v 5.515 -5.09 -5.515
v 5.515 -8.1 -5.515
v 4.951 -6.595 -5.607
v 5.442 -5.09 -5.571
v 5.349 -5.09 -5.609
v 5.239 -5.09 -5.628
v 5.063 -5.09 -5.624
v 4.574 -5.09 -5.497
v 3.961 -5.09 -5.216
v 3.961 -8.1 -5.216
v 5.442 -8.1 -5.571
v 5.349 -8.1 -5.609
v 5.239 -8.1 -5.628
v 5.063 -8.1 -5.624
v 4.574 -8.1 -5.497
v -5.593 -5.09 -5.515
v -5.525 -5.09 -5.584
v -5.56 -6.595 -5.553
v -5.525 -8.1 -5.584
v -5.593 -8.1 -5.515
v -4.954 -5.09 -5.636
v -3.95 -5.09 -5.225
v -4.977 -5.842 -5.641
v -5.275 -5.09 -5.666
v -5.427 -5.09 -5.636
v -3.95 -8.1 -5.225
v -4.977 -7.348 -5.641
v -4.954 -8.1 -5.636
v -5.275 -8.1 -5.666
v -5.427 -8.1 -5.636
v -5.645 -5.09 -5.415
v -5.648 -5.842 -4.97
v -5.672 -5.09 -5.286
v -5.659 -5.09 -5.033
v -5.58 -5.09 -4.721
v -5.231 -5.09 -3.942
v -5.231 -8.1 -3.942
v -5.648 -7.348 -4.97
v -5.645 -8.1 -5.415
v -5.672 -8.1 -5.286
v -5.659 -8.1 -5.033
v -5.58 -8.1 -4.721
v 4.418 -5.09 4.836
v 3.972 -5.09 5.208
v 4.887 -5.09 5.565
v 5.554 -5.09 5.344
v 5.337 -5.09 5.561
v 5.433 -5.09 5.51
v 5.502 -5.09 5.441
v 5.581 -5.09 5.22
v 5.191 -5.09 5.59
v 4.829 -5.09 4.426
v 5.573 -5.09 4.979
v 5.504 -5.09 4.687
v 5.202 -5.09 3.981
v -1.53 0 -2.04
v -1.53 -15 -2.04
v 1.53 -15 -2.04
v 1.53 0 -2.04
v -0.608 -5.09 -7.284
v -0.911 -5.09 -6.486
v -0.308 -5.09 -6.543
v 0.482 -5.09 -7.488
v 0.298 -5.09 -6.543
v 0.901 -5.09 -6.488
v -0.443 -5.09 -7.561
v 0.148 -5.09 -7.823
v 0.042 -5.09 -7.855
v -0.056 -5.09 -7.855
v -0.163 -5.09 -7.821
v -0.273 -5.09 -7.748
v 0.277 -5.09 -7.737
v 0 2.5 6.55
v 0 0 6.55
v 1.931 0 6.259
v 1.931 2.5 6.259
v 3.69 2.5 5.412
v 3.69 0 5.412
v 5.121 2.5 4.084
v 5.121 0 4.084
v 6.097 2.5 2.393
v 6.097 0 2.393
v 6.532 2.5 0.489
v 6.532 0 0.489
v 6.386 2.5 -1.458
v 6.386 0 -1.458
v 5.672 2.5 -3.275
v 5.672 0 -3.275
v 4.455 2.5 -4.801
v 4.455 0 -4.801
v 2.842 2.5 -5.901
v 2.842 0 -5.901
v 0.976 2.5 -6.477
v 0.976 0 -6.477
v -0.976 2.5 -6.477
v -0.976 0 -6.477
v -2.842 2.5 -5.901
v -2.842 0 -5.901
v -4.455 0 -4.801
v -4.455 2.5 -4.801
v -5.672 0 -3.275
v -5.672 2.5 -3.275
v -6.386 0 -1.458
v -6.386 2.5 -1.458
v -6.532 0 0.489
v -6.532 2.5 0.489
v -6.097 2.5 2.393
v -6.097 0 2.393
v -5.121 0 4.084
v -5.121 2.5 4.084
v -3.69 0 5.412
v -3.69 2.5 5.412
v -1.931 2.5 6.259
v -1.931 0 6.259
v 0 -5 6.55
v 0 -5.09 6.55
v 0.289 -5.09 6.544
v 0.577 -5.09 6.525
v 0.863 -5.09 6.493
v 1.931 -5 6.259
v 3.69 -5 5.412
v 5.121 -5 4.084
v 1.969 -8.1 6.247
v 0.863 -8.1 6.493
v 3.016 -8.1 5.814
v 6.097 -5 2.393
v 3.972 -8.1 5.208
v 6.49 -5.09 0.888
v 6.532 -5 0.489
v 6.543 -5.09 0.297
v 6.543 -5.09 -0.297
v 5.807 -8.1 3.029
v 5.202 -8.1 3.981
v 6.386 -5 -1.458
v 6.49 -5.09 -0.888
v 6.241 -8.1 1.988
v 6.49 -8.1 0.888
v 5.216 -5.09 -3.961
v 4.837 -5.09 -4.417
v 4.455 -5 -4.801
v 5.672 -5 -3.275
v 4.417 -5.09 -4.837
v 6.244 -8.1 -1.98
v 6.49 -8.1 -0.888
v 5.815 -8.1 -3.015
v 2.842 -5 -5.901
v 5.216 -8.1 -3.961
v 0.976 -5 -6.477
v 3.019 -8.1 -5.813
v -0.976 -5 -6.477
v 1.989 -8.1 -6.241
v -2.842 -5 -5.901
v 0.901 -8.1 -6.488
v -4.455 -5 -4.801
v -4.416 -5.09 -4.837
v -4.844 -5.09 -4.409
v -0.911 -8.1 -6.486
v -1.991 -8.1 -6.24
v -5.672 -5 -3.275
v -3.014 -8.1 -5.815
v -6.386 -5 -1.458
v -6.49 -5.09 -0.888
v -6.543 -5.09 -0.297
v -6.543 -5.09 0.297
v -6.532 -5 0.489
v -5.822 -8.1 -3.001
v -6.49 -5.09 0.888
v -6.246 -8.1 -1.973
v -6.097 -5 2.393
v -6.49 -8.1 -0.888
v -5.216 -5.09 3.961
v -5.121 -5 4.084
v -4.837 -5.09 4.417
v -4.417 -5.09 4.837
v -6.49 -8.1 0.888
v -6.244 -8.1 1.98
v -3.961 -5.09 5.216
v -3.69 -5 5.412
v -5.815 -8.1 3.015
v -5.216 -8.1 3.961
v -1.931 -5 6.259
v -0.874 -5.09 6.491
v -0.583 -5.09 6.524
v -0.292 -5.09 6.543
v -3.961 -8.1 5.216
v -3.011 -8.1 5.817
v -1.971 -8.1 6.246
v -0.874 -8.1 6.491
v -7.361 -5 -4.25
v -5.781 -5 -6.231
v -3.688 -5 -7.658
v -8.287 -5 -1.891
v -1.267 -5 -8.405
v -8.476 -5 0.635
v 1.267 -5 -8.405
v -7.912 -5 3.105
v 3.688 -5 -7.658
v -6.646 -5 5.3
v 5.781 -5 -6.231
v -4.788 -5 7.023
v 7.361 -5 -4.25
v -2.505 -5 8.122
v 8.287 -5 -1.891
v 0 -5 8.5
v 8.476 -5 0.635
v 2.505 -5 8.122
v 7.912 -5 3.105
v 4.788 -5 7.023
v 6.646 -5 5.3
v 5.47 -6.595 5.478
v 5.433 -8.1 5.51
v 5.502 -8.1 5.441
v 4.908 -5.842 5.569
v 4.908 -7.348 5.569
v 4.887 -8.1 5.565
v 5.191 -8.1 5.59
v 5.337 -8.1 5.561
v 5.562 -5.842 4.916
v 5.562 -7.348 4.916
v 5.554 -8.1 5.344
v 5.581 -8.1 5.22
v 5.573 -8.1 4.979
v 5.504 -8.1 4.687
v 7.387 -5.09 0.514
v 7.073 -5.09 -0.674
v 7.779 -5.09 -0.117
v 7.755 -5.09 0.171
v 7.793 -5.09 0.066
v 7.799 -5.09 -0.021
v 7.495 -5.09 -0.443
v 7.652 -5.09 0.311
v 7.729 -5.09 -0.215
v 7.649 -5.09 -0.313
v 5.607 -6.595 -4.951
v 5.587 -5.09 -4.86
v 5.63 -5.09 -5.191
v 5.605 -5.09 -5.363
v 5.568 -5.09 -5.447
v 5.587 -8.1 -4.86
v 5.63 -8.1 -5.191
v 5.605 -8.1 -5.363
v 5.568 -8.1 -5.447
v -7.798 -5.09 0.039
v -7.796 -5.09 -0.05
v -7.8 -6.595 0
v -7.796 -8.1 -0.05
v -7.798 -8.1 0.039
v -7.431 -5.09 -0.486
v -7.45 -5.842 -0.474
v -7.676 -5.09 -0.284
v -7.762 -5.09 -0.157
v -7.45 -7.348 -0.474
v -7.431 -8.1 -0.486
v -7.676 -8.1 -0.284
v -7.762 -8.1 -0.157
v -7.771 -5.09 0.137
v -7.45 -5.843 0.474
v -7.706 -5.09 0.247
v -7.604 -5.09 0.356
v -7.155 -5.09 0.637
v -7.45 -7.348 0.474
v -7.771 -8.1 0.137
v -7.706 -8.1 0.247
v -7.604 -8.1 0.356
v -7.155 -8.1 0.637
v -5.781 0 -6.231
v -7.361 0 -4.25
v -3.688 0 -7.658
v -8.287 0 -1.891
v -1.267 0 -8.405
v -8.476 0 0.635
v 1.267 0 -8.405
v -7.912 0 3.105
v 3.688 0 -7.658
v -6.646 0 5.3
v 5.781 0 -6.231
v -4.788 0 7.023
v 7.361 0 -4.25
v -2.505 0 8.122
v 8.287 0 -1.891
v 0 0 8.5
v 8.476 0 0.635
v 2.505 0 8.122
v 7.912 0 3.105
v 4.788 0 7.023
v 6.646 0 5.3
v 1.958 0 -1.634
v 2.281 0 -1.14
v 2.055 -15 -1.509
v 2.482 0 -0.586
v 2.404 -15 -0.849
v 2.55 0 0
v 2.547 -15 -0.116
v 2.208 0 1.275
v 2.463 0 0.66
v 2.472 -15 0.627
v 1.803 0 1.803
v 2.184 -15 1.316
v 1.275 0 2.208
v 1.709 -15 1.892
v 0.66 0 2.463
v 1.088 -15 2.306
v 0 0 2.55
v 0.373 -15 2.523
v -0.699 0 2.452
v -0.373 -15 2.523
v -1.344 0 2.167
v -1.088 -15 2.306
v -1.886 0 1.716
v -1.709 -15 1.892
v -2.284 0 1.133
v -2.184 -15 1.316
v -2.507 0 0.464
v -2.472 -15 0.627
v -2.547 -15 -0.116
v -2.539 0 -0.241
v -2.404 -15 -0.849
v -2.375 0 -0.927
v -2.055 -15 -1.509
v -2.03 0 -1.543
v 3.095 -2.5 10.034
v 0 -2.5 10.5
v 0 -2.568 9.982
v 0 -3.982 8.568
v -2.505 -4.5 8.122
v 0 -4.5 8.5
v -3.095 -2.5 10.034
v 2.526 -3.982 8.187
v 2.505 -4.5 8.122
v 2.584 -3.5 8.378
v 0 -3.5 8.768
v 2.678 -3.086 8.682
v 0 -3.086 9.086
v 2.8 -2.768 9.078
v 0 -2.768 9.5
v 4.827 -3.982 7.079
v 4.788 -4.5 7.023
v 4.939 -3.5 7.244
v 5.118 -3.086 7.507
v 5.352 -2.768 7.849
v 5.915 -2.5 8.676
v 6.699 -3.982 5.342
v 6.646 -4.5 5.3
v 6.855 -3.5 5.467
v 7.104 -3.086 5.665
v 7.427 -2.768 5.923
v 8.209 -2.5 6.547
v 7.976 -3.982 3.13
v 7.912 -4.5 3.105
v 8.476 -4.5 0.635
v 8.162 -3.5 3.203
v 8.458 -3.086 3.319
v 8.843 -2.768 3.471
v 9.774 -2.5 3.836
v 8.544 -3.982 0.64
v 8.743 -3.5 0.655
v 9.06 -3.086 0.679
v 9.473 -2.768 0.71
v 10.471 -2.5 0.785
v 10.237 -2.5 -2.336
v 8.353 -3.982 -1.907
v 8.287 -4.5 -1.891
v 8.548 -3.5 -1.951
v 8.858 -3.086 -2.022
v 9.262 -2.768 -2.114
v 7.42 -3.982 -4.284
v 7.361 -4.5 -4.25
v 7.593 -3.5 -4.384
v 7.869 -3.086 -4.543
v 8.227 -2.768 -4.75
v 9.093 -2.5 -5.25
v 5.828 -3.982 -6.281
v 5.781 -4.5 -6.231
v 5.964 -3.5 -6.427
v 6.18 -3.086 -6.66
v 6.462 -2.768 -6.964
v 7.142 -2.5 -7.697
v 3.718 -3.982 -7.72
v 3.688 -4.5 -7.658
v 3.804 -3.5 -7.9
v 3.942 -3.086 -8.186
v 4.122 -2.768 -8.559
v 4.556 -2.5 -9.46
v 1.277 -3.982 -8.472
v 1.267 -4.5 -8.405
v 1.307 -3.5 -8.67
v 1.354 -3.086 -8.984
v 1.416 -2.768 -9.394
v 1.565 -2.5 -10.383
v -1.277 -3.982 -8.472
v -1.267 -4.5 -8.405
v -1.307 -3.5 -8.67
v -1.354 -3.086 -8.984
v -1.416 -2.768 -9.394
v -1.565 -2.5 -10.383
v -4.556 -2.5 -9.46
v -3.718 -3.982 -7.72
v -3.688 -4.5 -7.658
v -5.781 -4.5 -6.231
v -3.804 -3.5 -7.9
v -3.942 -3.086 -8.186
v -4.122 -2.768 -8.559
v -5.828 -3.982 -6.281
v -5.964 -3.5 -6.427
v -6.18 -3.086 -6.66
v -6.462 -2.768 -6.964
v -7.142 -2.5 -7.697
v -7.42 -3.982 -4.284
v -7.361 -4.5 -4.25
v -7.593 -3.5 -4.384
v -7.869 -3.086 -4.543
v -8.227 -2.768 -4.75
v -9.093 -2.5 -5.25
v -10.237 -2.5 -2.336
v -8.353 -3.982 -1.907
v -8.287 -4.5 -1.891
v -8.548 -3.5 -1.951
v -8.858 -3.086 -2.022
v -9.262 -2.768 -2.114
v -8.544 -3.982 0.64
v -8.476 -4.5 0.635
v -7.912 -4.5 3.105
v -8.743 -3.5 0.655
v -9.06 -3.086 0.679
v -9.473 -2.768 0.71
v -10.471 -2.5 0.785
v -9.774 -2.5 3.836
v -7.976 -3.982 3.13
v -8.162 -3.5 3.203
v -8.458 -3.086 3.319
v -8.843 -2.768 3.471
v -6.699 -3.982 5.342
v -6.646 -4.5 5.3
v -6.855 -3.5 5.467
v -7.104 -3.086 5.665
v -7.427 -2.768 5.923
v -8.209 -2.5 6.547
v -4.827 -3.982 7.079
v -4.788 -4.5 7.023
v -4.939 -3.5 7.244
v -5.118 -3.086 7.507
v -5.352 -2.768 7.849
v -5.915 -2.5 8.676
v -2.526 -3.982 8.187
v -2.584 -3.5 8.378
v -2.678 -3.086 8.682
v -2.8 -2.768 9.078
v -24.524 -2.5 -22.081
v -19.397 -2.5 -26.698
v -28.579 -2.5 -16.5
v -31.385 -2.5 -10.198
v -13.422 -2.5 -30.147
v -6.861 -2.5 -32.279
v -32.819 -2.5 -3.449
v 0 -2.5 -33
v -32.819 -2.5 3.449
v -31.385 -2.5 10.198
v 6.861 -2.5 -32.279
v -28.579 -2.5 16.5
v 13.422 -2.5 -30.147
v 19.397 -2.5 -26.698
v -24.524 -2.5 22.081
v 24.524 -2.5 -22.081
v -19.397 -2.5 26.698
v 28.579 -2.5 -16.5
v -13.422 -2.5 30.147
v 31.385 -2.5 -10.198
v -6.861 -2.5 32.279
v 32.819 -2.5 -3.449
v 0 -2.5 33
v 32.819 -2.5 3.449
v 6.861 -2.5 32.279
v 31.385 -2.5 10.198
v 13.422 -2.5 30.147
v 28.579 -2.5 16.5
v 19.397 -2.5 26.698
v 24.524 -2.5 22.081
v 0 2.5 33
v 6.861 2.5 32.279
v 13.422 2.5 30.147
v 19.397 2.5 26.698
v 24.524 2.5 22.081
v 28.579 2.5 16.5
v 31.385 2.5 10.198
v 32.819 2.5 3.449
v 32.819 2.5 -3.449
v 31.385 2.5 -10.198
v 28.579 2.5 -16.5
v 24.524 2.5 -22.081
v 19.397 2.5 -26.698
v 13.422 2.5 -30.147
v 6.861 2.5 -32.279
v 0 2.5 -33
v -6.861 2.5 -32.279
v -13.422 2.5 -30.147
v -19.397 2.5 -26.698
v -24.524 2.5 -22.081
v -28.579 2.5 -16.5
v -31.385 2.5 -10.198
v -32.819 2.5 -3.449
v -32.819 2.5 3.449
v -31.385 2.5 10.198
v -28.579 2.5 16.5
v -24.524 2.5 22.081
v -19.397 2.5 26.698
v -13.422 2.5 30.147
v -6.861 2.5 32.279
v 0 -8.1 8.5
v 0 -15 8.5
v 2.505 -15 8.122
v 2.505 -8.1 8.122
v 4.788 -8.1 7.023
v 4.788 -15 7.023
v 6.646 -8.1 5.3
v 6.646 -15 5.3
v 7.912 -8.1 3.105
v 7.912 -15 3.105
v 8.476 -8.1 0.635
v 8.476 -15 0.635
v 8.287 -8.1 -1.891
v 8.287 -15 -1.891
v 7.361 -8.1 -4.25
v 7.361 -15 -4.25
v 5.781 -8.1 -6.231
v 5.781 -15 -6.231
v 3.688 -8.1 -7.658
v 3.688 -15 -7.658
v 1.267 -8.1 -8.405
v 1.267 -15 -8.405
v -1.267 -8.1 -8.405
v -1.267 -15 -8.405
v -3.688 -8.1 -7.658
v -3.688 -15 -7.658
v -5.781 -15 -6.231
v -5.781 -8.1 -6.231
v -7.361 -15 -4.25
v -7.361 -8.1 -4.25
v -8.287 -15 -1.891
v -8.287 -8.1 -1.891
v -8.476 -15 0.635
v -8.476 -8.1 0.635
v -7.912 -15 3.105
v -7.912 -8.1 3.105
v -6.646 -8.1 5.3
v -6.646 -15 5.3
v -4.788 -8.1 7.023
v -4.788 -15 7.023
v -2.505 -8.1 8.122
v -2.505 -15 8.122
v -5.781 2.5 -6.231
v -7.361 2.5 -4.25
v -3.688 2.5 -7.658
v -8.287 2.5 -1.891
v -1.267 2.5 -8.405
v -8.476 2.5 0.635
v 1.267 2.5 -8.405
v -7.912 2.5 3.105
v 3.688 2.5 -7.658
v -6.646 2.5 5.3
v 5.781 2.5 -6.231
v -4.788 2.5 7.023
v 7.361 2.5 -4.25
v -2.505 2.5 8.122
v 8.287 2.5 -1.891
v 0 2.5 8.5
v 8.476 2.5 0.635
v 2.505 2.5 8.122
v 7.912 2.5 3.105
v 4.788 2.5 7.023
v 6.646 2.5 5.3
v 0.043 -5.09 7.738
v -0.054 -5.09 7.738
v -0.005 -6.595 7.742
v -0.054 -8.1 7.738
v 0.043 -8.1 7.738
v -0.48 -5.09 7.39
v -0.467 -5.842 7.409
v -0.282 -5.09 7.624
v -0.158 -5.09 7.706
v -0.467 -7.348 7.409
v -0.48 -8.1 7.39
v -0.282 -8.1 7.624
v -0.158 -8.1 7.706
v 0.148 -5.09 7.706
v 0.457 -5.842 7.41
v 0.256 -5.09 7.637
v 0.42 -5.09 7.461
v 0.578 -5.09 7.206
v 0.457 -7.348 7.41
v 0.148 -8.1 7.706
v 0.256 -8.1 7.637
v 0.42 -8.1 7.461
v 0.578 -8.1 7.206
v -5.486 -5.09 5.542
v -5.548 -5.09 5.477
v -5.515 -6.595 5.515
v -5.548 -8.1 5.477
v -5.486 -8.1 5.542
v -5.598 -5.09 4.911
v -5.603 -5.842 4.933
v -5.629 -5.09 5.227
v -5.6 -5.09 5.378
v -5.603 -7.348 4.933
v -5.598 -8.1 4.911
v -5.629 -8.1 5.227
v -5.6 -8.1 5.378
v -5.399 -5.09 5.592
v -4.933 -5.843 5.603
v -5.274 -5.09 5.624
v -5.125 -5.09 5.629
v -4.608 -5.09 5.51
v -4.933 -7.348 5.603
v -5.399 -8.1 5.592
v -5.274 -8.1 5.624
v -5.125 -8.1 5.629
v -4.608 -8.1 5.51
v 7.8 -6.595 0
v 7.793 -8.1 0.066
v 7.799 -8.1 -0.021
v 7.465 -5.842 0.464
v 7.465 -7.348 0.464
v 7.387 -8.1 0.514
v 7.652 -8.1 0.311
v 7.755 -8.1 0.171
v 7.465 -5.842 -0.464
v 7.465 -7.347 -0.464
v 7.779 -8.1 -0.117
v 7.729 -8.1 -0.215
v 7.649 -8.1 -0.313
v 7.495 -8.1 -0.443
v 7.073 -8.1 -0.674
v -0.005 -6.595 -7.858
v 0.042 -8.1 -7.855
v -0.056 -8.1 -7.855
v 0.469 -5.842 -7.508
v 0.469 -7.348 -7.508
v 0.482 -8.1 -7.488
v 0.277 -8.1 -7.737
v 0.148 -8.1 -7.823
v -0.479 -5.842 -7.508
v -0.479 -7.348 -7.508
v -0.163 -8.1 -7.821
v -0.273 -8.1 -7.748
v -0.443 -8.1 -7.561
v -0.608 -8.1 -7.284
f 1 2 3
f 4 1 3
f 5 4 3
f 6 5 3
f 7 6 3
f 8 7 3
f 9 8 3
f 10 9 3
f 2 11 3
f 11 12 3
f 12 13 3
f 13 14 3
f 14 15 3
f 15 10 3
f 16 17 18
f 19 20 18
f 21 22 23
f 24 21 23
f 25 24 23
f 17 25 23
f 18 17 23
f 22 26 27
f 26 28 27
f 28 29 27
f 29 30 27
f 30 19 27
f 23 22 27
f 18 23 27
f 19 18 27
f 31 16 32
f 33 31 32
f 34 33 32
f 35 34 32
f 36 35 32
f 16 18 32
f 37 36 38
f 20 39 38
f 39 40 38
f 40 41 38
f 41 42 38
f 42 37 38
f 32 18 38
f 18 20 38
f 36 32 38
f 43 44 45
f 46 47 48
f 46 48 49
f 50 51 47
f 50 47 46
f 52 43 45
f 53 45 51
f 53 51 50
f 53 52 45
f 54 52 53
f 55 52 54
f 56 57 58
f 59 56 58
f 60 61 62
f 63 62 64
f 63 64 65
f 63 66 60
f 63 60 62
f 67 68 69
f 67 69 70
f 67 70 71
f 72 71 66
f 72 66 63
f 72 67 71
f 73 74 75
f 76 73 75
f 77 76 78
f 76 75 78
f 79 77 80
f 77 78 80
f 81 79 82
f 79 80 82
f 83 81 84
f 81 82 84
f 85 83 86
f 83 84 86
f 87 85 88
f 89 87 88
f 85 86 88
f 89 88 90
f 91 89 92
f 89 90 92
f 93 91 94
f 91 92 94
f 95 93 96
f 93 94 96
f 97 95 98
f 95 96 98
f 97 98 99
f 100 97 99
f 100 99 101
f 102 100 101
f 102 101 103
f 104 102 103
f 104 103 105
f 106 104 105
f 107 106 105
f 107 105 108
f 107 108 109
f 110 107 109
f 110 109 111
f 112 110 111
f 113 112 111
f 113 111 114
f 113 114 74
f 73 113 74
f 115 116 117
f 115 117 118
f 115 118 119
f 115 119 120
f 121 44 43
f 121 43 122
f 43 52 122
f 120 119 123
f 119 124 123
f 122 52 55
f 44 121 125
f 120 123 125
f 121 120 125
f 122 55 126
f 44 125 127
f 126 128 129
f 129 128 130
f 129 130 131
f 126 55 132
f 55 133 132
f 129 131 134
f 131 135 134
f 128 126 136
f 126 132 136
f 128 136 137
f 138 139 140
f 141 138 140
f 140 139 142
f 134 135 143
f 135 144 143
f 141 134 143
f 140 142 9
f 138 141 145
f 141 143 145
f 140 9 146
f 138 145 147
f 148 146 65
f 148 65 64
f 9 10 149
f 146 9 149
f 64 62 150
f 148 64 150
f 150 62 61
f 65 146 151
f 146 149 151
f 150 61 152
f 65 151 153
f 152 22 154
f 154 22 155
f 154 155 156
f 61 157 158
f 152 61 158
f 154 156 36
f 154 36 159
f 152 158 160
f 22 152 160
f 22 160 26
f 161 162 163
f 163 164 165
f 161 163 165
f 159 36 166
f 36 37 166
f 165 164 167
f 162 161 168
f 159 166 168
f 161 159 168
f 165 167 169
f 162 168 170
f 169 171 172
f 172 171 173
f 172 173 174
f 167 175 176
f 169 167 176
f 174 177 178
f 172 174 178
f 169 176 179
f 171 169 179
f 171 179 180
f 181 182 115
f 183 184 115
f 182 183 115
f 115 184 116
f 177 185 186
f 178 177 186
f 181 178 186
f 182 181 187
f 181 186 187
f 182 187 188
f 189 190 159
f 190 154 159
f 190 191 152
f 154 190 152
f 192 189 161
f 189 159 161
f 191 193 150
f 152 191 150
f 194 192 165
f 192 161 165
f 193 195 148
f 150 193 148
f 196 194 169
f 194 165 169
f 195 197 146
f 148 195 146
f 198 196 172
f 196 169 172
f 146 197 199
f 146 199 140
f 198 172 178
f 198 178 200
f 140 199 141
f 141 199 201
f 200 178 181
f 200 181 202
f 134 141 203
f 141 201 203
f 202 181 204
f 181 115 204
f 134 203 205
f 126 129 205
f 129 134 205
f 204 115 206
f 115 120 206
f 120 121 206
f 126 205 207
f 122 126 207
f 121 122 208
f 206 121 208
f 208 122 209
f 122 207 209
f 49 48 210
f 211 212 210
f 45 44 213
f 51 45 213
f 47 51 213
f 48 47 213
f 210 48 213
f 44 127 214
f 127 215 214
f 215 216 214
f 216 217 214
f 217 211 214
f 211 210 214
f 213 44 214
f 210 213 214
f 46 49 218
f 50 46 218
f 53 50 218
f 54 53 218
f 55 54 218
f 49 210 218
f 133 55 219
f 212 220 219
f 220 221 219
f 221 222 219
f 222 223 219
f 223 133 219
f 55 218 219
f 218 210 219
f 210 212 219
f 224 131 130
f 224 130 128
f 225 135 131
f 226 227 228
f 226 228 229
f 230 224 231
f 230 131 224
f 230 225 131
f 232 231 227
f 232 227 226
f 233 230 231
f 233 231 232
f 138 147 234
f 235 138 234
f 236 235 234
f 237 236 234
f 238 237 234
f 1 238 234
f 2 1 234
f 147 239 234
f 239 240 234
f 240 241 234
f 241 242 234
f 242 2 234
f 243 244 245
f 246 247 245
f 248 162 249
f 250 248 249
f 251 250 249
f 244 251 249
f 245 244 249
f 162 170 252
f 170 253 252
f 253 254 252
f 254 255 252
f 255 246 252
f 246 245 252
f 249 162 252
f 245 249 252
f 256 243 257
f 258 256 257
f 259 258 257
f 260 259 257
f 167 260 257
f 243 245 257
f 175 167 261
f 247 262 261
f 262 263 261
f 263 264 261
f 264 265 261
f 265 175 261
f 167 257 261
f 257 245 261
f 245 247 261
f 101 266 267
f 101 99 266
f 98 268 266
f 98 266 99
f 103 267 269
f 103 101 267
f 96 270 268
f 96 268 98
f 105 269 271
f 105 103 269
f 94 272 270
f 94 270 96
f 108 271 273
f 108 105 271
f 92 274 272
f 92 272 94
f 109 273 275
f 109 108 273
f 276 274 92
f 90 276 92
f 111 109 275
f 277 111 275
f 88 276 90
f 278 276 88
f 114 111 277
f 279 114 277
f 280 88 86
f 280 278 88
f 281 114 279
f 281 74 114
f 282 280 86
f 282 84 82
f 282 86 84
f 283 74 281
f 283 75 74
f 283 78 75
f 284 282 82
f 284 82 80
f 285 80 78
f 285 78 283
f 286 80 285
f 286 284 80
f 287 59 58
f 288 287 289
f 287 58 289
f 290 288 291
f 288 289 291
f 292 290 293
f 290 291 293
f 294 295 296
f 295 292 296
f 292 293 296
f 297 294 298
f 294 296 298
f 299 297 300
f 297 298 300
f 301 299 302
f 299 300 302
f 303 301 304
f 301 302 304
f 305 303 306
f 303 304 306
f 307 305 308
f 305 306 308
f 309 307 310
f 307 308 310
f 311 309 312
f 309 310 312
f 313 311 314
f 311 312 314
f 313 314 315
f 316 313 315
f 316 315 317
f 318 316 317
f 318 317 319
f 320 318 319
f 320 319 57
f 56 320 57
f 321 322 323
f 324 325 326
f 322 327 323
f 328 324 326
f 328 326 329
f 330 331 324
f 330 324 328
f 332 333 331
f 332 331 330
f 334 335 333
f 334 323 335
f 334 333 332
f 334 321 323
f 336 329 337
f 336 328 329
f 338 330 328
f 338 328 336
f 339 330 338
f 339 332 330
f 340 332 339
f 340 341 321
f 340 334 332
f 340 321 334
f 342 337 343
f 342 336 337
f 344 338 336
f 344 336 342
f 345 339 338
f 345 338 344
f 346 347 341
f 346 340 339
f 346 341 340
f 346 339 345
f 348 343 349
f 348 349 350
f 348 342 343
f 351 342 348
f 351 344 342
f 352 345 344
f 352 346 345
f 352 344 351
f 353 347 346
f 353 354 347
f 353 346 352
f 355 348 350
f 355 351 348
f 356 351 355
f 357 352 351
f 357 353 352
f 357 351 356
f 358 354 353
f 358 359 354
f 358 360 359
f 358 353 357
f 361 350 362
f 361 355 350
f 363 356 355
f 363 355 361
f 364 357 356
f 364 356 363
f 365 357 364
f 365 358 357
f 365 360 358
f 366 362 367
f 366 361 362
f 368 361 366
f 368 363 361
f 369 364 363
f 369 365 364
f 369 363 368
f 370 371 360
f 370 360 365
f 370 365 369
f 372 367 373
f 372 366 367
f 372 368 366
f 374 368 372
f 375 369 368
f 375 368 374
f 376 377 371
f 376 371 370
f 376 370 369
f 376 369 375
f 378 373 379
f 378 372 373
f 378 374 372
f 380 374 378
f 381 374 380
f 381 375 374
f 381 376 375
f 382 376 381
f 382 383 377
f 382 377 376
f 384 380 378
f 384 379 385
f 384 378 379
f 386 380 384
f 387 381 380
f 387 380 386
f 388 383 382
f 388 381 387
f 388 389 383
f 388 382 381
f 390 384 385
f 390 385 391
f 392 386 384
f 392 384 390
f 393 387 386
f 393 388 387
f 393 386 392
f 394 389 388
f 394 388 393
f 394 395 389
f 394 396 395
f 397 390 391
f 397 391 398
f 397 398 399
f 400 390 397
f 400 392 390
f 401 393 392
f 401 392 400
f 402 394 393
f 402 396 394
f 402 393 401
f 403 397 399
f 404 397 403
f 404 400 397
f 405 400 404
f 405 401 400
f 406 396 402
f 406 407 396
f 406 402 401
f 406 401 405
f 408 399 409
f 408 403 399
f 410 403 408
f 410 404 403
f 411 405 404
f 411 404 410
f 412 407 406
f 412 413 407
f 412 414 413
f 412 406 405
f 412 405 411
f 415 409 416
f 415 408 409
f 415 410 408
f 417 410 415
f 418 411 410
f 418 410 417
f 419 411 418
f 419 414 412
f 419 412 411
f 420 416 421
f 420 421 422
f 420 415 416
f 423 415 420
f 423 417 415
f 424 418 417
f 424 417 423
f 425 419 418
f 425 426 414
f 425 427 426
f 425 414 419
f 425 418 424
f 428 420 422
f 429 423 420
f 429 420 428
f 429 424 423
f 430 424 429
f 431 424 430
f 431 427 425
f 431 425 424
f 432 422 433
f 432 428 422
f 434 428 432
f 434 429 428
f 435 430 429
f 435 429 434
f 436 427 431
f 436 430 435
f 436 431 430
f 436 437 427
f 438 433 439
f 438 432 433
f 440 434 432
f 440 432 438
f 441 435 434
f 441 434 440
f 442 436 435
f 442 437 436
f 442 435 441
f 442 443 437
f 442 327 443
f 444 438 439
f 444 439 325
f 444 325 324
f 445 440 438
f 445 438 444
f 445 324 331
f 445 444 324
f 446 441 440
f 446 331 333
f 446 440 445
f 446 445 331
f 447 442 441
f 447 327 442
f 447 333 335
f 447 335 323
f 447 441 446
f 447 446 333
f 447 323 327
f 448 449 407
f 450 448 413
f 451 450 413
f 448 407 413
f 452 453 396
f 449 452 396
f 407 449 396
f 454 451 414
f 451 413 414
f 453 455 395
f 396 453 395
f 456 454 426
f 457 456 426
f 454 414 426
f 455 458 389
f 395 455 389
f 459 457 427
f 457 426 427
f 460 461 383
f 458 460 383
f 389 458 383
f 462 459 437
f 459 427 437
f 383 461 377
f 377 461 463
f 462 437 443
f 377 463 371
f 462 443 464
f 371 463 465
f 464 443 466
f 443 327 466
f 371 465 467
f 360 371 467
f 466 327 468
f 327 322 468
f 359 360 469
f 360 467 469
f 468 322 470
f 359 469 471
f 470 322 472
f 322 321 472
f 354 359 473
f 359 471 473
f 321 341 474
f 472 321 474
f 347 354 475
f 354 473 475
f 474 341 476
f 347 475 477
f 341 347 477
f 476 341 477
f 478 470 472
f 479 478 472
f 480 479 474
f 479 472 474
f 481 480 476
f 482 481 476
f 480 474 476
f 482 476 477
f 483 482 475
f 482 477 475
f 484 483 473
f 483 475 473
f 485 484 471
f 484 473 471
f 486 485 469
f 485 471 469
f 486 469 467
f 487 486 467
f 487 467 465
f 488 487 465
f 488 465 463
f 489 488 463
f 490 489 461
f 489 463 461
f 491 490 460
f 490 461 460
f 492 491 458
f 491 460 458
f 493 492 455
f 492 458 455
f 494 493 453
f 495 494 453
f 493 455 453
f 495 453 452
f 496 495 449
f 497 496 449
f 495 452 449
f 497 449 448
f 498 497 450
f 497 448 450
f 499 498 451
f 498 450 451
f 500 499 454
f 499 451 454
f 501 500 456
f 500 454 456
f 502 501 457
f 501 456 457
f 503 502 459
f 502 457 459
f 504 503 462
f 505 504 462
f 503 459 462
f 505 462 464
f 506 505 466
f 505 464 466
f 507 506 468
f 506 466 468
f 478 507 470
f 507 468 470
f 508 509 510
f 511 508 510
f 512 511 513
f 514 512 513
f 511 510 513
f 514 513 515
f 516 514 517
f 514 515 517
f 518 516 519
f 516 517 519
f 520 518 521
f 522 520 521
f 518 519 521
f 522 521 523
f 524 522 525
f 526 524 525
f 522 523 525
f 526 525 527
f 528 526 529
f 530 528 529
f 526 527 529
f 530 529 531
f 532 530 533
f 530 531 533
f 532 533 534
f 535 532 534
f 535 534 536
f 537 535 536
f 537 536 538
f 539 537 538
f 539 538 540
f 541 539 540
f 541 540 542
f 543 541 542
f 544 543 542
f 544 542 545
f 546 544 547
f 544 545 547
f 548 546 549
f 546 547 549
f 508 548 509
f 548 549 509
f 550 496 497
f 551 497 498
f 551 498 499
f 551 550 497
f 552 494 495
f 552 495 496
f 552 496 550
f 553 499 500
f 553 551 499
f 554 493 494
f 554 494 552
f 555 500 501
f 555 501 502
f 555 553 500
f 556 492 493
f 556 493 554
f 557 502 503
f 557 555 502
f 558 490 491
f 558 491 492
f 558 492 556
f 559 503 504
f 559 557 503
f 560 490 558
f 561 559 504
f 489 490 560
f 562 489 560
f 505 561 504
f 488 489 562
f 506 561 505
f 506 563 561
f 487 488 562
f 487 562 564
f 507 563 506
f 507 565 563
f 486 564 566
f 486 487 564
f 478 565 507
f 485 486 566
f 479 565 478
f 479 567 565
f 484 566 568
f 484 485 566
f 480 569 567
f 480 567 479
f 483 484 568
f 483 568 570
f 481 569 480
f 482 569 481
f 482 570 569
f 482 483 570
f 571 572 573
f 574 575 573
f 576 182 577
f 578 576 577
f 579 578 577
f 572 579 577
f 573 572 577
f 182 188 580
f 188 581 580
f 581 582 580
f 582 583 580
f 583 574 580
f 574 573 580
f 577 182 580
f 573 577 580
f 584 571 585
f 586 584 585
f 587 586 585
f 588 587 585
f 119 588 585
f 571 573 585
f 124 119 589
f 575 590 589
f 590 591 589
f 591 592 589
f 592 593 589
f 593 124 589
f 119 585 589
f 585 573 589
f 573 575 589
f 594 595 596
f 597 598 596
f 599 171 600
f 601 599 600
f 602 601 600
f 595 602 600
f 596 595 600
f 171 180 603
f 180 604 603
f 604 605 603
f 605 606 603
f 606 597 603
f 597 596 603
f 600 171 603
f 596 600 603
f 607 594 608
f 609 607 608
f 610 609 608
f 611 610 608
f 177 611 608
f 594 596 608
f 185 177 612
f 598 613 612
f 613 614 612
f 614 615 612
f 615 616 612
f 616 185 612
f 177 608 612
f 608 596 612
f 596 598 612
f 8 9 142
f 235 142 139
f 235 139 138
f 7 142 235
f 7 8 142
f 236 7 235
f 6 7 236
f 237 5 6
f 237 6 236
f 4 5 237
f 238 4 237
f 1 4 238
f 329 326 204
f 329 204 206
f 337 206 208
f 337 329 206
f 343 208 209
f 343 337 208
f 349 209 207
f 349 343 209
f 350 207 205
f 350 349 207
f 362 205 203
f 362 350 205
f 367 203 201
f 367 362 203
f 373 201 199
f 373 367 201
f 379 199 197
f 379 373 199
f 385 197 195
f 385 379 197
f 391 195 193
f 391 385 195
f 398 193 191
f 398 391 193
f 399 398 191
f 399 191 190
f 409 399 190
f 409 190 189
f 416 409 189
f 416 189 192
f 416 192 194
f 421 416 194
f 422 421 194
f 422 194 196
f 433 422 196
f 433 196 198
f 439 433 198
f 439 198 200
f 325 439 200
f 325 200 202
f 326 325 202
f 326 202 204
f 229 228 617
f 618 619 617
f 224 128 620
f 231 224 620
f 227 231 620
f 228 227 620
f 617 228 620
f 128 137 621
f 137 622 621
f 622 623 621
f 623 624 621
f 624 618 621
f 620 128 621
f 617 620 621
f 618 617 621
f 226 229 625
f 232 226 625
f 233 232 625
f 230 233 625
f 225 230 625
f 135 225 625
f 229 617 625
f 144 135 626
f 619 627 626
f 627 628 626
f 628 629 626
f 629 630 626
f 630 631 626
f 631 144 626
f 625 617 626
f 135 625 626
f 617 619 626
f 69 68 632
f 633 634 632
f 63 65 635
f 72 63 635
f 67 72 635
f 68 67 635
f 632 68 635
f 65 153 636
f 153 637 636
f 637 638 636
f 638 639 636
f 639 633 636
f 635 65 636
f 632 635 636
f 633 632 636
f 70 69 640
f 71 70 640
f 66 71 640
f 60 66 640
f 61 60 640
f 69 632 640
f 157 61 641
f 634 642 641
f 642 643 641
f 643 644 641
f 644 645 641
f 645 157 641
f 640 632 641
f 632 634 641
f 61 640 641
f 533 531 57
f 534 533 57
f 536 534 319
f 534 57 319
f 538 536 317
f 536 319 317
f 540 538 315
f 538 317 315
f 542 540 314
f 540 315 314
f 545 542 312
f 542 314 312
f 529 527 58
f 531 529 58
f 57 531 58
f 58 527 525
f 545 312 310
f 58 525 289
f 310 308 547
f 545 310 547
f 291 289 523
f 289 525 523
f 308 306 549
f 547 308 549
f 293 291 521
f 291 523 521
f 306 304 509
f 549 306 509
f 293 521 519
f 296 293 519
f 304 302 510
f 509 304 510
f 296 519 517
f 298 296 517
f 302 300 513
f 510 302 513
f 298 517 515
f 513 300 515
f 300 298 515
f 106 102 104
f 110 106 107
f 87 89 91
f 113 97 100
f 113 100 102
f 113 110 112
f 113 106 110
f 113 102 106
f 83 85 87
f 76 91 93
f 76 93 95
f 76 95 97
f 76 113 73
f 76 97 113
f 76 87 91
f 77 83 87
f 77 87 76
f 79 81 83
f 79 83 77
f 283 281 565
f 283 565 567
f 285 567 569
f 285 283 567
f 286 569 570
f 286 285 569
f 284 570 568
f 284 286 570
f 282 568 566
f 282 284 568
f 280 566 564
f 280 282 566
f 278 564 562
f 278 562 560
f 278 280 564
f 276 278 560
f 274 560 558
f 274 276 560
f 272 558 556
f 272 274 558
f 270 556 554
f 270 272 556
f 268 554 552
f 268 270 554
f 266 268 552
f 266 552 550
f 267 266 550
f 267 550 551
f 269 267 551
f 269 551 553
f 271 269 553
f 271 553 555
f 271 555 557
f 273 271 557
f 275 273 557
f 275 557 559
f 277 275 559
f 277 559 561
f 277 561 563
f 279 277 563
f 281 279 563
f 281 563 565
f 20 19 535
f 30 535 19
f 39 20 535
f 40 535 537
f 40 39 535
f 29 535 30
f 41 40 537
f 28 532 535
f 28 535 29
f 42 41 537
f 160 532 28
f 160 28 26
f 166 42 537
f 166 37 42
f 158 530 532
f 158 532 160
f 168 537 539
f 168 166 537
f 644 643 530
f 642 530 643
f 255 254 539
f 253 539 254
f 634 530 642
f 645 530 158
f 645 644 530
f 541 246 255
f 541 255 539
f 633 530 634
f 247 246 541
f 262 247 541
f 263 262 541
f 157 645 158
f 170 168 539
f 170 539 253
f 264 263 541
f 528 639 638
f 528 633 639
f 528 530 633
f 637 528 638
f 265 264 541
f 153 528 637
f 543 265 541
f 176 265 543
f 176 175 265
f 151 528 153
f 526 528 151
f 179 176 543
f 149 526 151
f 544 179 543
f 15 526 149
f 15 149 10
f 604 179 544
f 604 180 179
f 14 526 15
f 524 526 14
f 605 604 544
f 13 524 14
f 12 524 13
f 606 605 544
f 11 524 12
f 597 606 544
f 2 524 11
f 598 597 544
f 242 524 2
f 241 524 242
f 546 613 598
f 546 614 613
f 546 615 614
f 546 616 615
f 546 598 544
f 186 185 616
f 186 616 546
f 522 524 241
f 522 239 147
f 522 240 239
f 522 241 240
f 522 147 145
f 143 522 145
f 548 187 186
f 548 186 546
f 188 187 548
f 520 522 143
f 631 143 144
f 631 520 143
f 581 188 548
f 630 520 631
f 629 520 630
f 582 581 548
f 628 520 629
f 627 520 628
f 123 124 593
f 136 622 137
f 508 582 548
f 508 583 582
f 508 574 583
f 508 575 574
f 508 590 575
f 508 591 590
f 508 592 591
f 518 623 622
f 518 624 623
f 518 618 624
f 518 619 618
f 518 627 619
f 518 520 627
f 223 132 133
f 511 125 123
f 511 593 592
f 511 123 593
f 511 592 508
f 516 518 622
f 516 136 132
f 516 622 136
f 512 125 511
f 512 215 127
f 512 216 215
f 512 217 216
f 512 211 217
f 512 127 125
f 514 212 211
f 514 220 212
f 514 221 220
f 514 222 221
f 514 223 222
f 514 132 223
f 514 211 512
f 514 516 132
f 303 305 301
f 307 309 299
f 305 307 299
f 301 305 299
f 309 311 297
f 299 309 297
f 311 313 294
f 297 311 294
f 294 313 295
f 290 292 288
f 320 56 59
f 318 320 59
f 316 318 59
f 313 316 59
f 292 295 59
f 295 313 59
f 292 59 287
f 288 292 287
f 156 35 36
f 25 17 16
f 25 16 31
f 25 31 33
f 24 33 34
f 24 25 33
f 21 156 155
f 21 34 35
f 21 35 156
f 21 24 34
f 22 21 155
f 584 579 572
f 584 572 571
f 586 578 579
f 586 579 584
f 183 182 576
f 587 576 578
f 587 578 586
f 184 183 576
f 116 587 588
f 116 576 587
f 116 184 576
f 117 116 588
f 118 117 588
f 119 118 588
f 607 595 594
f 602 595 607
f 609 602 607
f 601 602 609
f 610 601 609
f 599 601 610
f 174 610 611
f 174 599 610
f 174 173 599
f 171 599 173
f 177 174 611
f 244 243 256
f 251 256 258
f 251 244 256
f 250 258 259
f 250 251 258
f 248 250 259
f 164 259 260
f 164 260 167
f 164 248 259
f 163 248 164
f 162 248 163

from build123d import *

# Parameters (mm, degrees)
BOSS_EXTRUDE1_DEPTH      = 2.5
BOSS_EXTRUDE1_DEPTH_BACK = 2.5
SKETCH1_R                = 33
SKETCH1_R_2              = 8.5
BOSS_EXTRUDE2_DEPTH      = 2.5
BOSS_EXTRUDE3_DEPTH      = 2.5
BOSS_EXTRUDE3_DEPTH_BACK = 15
SKETCH1_5_R              = 6.55
SKETCH1_6_R              = 8.5
SKETCH1_6_R_2            = 6.55
BOSS_EXTRUDE4_DEPTH      = 5
BOSS_EXTRUDE5_START      = -6.9
SKETCH2_R                = 8.5
SKETCH2_R_2              = 2.55
BOSS_EXTRUDE5_DEPTH      = 6.9
FILLET1_R                = 2
BOSS_EXTRUDE6_DEPTH      = 3.01


with BuildPart() as part:
    # Sketch1 → Boss-Extrude1 (new, two sides: drawn at the far end of the back side and taken through both)
    with BuildSketch(Plane(origin=(0, 0, 0), x_dir=(1, 0, 0), z_dir=(0, 1, 0)).offset(-BOSS_EXTRUDE1_DEPTH_BACK)):
        with Locations(Location((0, 0, 0), (0, 0, 270))):
            Circle(SKETCH1_R)
        with Locations(Location((0, 0, 0), (0, 0, 270))):
            Circle(SKETCH1_R_2, mode=Mode.SUBTRACT)
    extrude(amount=BOSS_EXTRUDE1_DEPTH + BOSS_EXTRUDE1_DEPTH_BACK)



with BuildPart() as body_2:
    # Sketch1<4> → Boss-Extrude2 (new body)
    with BuildSketch(Plane(origin=(0, 0, 0), x_dir=(1, 0, 0), z_dir=(0, 1, 0))):
        with BuildLine():
            ThreePointArc((-1.53, 2.04), (-2.41914241, -0.806380803), (0, -2.55))
            Line((0, -2.55), (0, 2.04))
            Line((0, 2.04), (-1.53, 2.04))
        make_face()
        with BuildLine():
            Line((0, 2.04), (0, -2.55))
            ThreePointArc((0, -2.55), (1.803122292, -1.803122292), (2.55, 0))
            ThreePointArc((2.55, 0), (2.280789337, 1.140394669), (1.53, 2.04))
            Line((1.53, 2.04), (0, 2.04))
        make_face()
    extrude(amount=BOSS_EXTRUDE2_DEPTH)

    # Sketch1<5> → Boss-Extrude3 (add, two sides: drawn at the far end of the back side and taken through both)
    with BuildSketch(Plane(origin=(0, 0, 0), x_dir=(1, 0, 0), z_dir=(0, 1, 0)).offset(-BOSS_EXTRUDE3_DEPTH_BACK)):
        with Locations(Location((0, 0, 0), (0, 0, 270))):
            Circle(SKETCH1_5_R)
        with BuildLine():
            Line((-1.53, 2.04), (1.53, 2.04))
            ThreePointArc((1.53, 2.04), (0, -2.55), (-1.53, 2.04))
        make_face(mode=Mode.SUBTRACT)
    extrude(amount=BOSS_EXTRUDE3_DEPTH + BOSS_EXTRUDE3_DEPTH_BACK)


with BuildPart() as part_1:
    add(part.part)

    add(body_2.part)  # Boss-Extrude4 merges body 2
    # Sketch1<6> → Boss-Extrude4 (add)
    with BuildSketch(Plane(origin=(0, 0, 0), x_dir=(1, 0, 0), z_dir=(0, 1, 0))):
        with Locations(Location((0, 0, 0), (0, 0, 270))):
            Circle(SKETCH1_6_R)
        with Locations(Location((0, 0, 0), (0, 0, 270))):
            Circle(SKETCH1_6_R_2, mode=Mode.SUBTRACT)
    extrude(amount=-BOSS_EXTRUDE4_DEPTH)

    # Sketch2 → Boss-Extrude5 (add)
    with BuildSketch(Plane(origin=(0, -8.1, 0), x_dir=(1, 0, 0), z_dir=(0, 1, 0)).offset(BOSS_EXTRUDE5_START)):
        with Locations(Location((0, 0, 0), (0, 0, 270))):
            Circle(SKETCH2_R)
        Circle(SKETCH2_R_2, mode=Mode.SUBTRACT)
    extrude(amount=BOSS_EXTRUDE5_DEPTH)

    # Fillet1
    fillet1_edges = [part_1.edges().sort_by_distance(p)[0] for p in [
        (0, -2.5, -8.5),
    ]]
    fillet(fillet1_edges, radius=FILLET1_R)

    # Sketch3 → Boss-Extrude6 (add)
    with BuildSketch(Plane(origin=(0, -8.1, 0), x_dir=(1, 0, 0), z_dir=(0, 1, 0))):
        with BuildLine():
            ThreePointArc((6.489574687, 0.887648796), (6.55, 0), (6.489574687, -0.887648796))
            add(Edge.make_bspline(
                [(6.489574687, -0.887648796), (7.8, -0.48452531), (7.8, 0)],
                knots=[5.695086191, 5.695086191, 5.695086191, 6.283185307, 6.283185307, 6.283185307], degree=2, weights=[1, 0.957078041, 1]))
            add(Edge.make_bspline(
                [(7.8, 0), (7.8, 0.48452531), (6.489574687, 0.887648796)],
                knots=[0, 0, 0, 0.588099116, 0.588099116, 0.588099116], degree=2, weights=[1, 0.957078041, 1]))
        make_face()
        with BuildLine():
            ThreePointArc((3.961159785, 5.216484751), (4.631549417, 4.631549417), (5.216484751, 3.961159785))
            add(Edge.make_bspline(
                [(5.216484751, 3.961159785), (5.858044026, 5.172821761), (5.515432893, 5.515432893)],
                knots=[5.695086191, 5.695086191, 5.695086191, 6.283185307, 6.283185307, 6.283185307], degree=2, weights=[1, 0.957078041, 1]))
            add(Edge.make_bspline(
                [(5.515432893, 5.515432893), (5.172821761, 5.858044026), (3.961159785, 5.216484751)],
                knots=[0, 0, 0, 0.588099116, 0.588099116, 0.588099116], degree=2, weights=[1, 0.957078041, 1]))
        make_face()
        with BuildLine():
            add(Edge.make_bspline(
                [(3.972298874, -5.208007456), (6.522331769, -6.529808173), (5.201644202, -3.98062779)],
                knots=[2.567584119, 2.567584119, 2.567584119, 3.715272936, 3.715272936, 3.715272936], degree=2, weights=[1, 0.839820193, 1]))
            ThreePointArc((5.201644202, -3.98062779), (4.627842164, -4.635253704), (3.972298874, -5.208007456))
        make_face()
        with BuildLine():
            ThreePointArc((-0.911324659, 6.486292267), (-0.00524075, 6.549997903), (0.900943942, 6.487742289))
            add(Edge.make_bspline(
                [(0.900943942, 6.487742289), (0.491618387, 7.85844559), (-0.004973928, 7.85844559)],
                knots=[5.681298558, 5.681298558, 5.681298558, 6.283185307, 6.283185307, 6.283185307], degree=2, weights=[1, 0.955057278, 1]))
            add(Edge.make_bspline(
                [(-0.004973928, 7.85844559), (-0.501854156, 7.85844559), (-0.911324659, 6.486292267)],
                knots=[0, 0, 0, 0.602215002, 0.602215002, 0.602215002], degree=2, weights=[1, 0.955008614, 1]))
        make_face()
        with BuildLine():
            add(Edge.make_bspline(
                [(-0.873777918, -6.491456859), (-0.005286616, -9.229256662), (0.863388985, -6.492846792)],
                knots=[2.567584119, 2.567584119, 2.567584119, 3.715272936, 3.715272936, 3.715272936], degree=2, weights=[1, 0.839820193, 1]))
            ThreePointArc((0.863388985, -6.492846792), (-0.00524075, -6.549997903), (-0.873777918, -6.491456859))
        make_face()
        with BuildLine():
            ThreePointArc((-5.230905092, 3.9420974), (-4.635253704, 4.627842164), (-3.950462996, 5.224590138))
            add(Edge.make_bspline(
                [(-3.950462996, 5.224590138), (-5.209133471, 5.904386861), (-5.560277264, 5.553243068)],
                knots=[5.681298558, 5.681298558, 5.681298558, 6.283185307, 6.283185307, 6.283185307], degree=2, weights=[1, 0.955057278, 1]))
            add(Edge.make_bspline(
                [(-5.560277264, 5.553243068), (-5.911624643, 5.201895689), (-5.230905092, 3.9420974)],
                knots=[0, 0, 0, 0.602215002, 0.602215002, 0.602215002], degree=2, weights=[1, 0.955008614, 1]))
        make_face()
        with BuildLine():
            add(Edge.make_bspline(
                [(-5.216484751, -3.961159785), (-6.629151931, -6.629151931), (-3.961159785, -5.216484751)],
                knots=[2.553493537, 2.553493537, 2.553493537, 3.72969177, 3.72969177, 3.72969177], degree=2, weights=[1, 0.831996755, 1]))
            ThreePointArc((-3.961159785, -5.216484751), (-4.631549417, -4.631549417), (-5.216484751, -3.961159785))
        make_face()
        with BuildLine():
            ThreePointArc((-6.489574687, -0.887648796), (-6.55, 0), (-6.489574687, 0.887648796))
            add(Edge.make_bspline(
                [(-6.489574687, 0.887648796), (-9.375036568, 0), (-6.489574687, -0.887648796)],
                knots=[2.553493537, 2.553493537, 2.553493537, 3.72969177, 3.72969177, 3.72969177], degree=2, weights=[1, 0.831996755, 1]))
        make_face()
    extrude(amount=BOSS_EXTRUDE6_DEPTH)


solid = part_1.part
